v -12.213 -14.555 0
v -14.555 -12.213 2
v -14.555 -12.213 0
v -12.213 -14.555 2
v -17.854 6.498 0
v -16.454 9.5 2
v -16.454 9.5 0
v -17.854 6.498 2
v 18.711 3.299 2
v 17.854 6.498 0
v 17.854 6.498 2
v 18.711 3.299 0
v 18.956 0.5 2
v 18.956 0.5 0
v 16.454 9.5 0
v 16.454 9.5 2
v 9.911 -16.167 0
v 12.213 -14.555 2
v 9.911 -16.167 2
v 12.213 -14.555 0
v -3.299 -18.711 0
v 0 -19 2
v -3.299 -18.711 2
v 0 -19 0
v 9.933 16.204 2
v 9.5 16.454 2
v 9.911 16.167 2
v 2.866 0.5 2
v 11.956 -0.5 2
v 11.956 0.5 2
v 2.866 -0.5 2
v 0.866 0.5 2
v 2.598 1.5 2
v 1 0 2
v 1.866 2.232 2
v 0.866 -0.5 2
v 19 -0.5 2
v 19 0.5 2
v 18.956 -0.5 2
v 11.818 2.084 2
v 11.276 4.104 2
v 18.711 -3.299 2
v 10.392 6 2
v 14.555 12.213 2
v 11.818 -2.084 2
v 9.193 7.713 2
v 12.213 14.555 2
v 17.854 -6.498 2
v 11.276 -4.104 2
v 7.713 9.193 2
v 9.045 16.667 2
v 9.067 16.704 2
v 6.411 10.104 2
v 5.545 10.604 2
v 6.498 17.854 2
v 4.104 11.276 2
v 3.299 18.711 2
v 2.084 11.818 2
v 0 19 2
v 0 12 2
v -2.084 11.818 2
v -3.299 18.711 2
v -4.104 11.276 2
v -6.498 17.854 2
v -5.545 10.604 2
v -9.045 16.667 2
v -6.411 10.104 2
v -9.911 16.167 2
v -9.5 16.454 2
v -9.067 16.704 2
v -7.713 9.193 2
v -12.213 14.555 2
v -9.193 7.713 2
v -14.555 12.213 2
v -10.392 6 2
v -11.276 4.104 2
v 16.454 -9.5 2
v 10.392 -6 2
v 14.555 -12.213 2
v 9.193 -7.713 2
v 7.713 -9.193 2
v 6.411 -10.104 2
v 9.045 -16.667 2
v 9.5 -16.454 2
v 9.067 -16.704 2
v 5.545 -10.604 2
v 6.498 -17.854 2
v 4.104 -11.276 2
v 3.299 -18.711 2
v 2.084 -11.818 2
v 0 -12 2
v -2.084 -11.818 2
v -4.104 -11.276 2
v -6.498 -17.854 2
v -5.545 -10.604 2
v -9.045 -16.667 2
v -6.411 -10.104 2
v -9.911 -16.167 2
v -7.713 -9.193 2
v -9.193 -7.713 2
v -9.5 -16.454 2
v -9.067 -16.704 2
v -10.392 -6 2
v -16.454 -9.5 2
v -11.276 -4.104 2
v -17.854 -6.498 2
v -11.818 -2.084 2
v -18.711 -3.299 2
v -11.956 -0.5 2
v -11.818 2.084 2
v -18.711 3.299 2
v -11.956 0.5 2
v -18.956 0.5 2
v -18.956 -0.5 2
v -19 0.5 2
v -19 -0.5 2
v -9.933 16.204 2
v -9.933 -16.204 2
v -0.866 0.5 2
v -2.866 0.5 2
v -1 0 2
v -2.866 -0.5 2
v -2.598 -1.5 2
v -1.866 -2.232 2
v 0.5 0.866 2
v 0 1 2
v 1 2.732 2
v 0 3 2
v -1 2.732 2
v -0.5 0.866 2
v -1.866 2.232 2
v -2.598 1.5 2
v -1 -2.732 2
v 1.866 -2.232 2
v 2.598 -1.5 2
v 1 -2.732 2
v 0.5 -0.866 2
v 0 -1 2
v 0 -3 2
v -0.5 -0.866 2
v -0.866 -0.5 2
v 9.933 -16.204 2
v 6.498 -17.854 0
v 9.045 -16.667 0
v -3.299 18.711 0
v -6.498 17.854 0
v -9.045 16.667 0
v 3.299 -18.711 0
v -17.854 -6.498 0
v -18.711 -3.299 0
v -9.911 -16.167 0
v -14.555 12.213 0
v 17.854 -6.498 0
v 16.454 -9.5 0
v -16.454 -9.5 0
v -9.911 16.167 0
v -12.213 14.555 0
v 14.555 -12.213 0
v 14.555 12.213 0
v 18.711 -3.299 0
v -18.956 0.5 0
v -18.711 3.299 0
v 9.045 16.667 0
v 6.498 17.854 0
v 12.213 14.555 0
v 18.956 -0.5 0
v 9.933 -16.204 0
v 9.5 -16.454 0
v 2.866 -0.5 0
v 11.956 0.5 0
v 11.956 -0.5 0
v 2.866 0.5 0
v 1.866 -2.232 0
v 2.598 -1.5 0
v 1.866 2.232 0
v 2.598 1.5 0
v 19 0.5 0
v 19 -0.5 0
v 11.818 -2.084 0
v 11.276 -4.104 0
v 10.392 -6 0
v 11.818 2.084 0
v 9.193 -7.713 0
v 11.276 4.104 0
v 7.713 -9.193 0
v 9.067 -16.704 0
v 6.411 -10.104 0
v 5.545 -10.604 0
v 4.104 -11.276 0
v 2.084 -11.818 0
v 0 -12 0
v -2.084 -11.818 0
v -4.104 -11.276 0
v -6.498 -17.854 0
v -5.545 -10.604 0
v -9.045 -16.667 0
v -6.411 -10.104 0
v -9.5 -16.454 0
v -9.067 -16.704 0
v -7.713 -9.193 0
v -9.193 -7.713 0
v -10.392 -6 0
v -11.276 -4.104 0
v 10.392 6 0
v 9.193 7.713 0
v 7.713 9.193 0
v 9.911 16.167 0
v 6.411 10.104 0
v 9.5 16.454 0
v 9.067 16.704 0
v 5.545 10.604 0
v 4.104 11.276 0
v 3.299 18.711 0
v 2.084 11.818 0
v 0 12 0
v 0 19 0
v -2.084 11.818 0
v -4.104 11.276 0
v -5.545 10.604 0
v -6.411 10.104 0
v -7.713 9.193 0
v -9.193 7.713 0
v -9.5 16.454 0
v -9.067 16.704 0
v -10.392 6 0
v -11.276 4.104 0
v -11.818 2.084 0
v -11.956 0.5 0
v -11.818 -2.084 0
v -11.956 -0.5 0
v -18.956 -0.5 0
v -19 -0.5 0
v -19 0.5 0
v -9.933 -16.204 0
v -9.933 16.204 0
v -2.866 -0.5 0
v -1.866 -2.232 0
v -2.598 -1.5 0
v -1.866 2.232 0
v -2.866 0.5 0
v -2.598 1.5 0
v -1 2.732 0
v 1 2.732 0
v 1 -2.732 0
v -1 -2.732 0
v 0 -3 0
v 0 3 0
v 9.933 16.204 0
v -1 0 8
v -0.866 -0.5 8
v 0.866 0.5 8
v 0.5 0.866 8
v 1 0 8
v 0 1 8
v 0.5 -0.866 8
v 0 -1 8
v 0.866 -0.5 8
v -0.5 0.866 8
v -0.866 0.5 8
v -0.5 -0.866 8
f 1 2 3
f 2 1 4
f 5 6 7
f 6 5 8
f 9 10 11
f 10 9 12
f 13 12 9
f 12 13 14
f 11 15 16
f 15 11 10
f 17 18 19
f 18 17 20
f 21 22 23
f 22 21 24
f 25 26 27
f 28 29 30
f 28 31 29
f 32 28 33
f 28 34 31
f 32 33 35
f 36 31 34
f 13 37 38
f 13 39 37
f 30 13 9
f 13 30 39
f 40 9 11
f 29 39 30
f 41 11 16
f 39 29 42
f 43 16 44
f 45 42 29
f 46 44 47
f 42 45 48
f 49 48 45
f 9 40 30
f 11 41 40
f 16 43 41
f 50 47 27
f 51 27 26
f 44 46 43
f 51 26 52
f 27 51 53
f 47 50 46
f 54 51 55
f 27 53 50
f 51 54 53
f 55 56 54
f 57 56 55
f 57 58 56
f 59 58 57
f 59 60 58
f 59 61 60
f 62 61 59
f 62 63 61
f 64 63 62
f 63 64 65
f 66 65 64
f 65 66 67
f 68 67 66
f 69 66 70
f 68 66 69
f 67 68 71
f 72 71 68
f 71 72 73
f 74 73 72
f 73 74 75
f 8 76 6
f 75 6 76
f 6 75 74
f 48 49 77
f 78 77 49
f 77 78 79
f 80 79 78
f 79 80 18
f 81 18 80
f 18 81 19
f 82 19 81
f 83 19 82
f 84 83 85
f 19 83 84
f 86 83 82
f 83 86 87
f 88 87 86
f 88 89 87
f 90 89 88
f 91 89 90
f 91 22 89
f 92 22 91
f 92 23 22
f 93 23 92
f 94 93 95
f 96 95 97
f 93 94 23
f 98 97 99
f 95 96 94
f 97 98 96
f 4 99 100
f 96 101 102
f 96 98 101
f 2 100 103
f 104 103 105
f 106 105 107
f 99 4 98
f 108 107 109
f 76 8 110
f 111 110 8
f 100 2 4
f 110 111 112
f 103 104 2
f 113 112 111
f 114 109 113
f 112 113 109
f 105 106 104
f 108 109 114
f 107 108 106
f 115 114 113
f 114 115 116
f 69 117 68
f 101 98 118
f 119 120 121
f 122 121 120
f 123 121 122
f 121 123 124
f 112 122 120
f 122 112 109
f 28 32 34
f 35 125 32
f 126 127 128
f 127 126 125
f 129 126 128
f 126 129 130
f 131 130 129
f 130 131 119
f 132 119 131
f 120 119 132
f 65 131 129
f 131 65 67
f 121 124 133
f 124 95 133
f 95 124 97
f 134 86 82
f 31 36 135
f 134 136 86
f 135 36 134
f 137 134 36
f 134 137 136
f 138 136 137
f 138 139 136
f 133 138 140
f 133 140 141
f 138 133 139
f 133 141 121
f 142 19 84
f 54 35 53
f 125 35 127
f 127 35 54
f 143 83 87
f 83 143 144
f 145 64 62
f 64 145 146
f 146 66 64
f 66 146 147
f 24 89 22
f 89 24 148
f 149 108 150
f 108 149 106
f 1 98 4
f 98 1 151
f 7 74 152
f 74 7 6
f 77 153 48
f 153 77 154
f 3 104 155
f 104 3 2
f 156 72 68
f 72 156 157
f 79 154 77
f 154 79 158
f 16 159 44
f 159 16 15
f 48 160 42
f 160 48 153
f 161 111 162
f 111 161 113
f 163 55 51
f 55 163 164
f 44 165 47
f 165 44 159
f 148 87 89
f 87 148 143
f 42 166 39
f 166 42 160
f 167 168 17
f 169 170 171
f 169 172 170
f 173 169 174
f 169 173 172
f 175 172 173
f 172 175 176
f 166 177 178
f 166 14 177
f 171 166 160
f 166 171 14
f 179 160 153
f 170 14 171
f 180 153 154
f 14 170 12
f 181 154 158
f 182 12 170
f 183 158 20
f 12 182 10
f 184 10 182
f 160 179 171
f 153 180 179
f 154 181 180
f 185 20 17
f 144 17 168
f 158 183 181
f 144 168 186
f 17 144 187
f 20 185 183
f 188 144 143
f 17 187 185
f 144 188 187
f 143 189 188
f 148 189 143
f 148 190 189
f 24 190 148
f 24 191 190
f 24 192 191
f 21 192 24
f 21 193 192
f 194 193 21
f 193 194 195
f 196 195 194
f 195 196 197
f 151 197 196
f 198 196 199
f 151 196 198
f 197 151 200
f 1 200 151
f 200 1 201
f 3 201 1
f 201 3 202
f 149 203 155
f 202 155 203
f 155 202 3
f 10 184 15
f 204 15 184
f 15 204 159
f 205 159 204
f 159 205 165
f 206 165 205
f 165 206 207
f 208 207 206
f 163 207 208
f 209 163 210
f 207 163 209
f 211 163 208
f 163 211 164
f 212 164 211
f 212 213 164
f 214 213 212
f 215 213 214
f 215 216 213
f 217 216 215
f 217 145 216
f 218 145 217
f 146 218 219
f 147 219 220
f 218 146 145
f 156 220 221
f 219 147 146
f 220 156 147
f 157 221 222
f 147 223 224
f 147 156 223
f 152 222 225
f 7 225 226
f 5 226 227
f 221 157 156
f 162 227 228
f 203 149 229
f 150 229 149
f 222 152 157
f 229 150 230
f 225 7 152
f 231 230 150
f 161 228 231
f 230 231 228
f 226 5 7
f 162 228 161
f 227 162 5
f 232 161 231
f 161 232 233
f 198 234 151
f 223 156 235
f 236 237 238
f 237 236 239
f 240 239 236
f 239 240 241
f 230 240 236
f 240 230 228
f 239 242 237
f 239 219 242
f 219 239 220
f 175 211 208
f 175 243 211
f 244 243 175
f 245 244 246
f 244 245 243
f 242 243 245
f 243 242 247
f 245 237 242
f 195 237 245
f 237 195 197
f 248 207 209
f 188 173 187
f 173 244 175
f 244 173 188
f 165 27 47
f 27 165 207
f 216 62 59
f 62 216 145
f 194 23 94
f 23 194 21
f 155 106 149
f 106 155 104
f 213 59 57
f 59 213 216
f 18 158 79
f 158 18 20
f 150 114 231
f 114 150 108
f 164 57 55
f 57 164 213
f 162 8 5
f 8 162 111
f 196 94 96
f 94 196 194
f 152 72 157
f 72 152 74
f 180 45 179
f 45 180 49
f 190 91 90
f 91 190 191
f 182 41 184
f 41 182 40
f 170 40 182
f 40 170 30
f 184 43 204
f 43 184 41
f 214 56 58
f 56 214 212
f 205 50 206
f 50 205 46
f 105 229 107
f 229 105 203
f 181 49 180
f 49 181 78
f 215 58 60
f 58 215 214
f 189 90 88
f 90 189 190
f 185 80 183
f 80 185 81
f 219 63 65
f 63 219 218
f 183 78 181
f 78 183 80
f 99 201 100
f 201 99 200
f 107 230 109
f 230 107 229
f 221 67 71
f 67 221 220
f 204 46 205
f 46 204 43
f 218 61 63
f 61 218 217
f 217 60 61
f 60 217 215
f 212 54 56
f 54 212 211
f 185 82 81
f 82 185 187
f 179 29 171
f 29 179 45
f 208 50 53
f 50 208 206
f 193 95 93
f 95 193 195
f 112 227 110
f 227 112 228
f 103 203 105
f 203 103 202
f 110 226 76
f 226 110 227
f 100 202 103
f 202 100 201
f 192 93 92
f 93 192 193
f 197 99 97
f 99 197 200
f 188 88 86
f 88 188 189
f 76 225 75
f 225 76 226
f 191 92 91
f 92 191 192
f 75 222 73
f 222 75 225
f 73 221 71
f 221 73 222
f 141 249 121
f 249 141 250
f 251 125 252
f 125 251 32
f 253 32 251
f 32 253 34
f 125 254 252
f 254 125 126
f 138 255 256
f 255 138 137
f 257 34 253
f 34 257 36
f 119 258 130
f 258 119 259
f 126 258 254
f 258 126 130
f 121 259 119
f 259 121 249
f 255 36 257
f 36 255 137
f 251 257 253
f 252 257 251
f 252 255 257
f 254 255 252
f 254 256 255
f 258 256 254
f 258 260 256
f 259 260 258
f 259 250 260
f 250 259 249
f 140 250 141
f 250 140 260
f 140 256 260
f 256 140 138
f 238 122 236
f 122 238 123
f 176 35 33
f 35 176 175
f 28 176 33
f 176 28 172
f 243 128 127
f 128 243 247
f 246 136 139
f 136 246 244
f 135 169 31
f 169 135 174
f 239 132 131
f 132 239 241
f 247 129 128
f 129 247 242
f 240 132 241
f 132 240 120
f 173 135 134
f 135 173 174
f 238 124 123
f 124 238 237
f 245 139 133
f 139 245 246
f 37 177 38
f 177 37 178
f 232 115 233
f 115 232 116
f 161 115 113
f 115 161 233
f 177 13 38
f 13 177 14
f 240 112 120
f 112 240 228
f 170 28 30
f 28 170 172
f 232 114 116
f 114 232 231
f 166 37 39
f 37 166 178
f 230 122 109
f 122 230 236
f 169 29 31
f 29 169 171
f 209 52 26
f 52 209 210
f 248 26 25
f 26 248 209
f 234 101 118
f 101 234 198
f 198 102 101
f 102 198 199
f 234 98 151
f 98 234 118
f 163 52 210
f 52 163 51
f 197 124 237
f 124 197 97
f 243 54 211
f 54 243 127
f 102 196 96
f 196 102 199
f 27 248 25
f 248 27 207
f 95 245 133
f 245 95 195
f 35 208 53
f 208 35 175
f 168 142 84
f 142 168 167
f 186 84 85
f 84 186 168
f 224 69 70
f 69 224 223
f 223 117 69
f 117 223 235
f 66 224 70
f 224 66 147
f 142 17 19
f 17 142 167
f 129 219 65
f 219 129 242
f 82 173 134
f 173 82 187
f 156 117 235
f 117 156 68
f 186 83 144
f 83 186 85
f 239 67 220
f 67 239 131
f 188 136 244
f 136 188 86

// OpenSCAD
//Máscara PFF1 S

//Prendedor
l=43; //largura
p=20; //profundidade
e=2; //espessura
d=27; //distância entre prendedores
pp=6; //profundidade do prendedor

//prendedor(l,p,d,e,pp);

module prendedor(l,p,d,e,pp) {
    difference() {
    cube([l,p,e], center=true);
        translate([-d/2,pp-p/2,0]) cylinder(d=2, h=10, $fn=12, center=true);
        translate([d/2,pp-p/2,0]) cylinder(d=2, h=10, $fn=12, center=true);
        translate([-d/2,-p/2+25+pp,0]) cube([1,50,10], center=true);
    translate([d/2,-p/2+25+pp,0]) cube([1,50,10], center=true);
}
}

//Filtro
a=10; //altura
d=30; //diâmetro principal
b=4; //borda
e=2; //espessura
so=9; //separação dos orifícios
po=16; //profundidade dos orifícios
ao=6; //altura dos orifícios
dc=4; //diâmetro do pino central

de=6; //diâmetro do hub
bf=7; //borda inferior

filtro_int(e,de,bf);
//filtro_ext(a,d,b,e,so,po,ao,dc);

module filtro_ext(a,d,b,e,so,po,ao,dc) { //parte externa do filtro
difference() {
union() {
    difference() {
    union() {
    cylinder(d=d+2*b, h=1, $fn=36);
    cylinder(d=d, h=a, $fn=36);
    }
    translate([0,0,-1]) cylinder(d=d-2*e, h=a, $fn=36);
    translate([d/2-po,so/2,a-ao-1]) cube([20,20,ao]);
    translate([d/2-po,-so/2-20,a-ao-1]) cube([20,20,ao]);
}
translate([0,0,a-ao-1]) cylinder(d=dc, h=ao+1, $fn=36);
}
cylinder(d=2, h=a-e, $fn=12);
}
}

module filtro_int (e,de,bf) { //parte interna
cylinder(d=2, h=a-e, $fn=12);
cylinder(d=de, h=e, $fn=12);
translate([0,0,e/2]) cube([d+2*b,1,e], center=true);    
    translate([0,0,e/2]) rotate(60) cube([d+2*b,1,e], center=true);    
    translate([0,0,e/2]) rotate(-60) cube([d+2*b,1,e], center=true);    
    difference() {
    cylinder(d=d+2*b, h=e, $fn=36);
        cylinder(d=d+2*b-2*bf, h=e, $fn=36);
        }
}
